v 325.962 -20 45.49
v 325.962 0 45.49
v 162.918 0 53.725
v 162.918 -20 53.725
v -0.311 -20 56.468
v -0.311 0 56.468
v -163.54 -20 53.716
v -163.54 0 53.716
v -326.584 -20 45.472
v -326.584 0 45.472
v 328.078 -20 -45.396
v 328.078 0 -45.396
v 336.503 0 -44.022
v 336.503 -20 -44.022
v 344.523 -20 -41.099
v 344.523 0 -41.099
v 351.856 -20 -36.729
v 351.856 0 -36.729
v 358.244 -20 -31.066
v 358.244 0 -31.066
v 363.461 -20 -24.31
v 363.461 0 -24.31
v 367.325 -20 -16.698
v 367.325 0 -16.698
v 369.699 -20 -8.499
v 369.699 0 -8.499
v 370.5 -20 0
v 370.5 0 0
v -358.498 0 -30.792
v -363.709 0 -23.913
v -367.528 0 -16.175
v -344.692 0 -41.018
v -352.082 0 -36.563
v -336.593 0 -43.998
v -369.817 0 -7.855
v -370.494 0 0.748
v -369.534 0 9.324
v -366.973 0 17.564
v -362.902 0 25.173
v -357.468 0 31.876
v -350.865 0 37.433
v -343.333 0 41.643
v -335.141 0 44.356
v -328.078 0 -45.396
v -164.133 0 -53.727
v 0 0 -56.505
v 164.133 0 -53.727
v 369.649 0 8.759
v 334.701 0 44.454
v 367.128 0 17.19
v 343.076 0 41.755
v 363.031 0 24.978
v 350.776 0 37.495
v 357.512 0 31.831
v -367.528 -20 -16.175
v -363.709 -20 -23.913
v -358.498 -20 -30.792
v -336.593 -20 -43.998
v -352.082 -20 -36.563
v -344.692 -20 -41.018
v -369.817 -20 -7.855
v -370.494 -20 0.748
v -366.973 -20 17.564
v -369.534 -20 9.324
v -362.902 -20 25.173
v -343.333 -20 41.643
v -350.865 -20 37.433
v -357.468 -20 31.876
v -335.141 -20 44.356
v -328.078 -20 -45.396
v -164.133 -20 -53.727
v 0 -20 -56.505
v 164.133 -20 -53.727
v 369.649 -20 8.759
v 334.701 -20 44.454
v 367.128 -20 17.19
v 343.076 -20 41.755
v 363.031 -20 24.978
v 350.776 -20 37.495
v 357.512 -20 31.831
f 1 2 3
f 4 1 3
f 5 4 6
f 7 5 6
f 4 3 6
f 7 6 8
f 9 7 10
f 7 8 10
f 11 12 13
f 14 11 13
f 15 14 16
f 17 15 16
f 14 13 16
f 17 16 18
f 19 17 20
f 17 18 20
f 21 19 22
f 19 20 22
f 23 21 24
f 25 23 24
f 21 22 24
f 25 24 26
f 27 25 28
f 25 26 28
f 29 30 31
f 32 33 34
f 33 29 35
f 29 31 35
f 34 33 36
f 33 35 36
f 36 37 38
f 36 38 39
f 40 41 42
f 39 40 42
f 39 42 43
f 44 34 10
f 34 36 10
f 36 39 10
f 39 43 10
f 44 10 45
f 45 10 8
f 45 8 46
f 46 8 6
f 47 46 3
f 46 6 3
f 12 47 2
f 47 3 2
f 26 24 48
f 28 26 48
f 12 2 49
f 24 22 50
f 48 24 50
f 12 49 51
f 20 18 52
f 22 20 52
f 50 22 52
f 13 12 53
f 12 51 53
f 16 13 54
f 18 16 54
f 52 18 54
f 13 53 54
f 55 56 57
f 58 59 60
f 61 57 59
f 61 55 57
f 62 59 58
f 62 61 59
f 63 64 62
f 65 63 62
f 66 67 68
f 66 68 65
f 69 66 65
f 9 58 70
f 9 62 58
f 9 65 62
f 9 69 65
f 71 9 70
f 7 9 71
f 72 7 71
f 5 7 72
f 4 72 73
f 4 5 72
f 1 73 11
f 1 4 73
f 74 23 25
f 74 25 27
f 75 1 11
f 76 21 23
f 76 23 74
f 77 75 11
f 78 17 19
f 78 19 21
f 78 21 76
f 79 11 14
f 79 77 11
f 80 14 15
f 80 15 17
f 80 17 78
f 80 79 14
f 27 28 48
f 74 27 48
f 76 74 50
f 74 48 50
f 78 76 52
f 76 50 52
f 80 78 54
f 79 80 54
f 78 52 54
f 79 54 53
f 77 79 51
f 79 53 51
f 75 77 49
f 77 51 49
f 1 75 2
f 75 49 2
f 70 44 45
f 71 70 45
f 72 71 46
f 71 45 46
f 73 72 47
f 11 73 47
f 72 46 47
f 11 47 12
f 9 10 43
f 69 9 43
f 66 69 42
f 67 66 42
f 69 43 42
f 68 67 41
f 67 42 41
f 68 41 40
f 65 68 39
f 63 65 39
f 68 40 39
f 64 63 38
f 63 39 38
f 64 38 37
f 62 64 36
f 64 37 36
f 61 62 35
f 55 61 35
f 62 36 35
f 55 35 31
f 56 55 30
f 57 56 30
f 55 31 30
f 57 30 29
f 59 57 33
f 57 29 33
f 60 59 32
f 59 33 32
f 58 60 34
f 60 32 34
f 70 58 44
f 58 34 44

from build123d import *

# Parameters (mm, degrees)
F1_DEPTH = 20


with BuildPart() as f1:
    # F0 (on Front) → F1 (new body)
    with BuildSketch(Plane.XZ):
        with BuildLine():
            ThreePointArc((-326.583678, 45.472431), (-293.391515, 32.728484), (-279.5, 0))
            Line((-279.5, 0), (279.5, 0))
            ThreePointArc((279.5, 0), (293.168529, 32.511651), (325.961867, 45.489832))
            ThreePointArc((325.961867, 45.489832), (-0.311198, 56.468207), (-326.583678, 45.472431))
        make_face()
        with BuildLine():
            Line((279.5, 0), (-279.5, 0))
            ThreePointArc((-279.5, 0), (-293.933876, -33.243735), (-328.077844, -45.39578))
            ThreePointArc((-328.077844, -45.39578), (0, -56.504902), (328.077844, -45.39578))
            ThreePointArc((328.077844, -45.39578), (293.933876, -33.243735), (279.5, 0))
        make_face()
        with BuildLine():
            ThreePointArc((-328.077844, -45.39578), (-293.933876, -33.243735), (-279.5, 0))
            ThreePointArc((-279.5, 0), (-293.391515, 32.728484), (-326.583678, 45.472431))
            ThreePointArc((-326.583678, 45.472431), (-370.49385, 0.748065), (-328.077844, -45.39578))
        make_face()
        with BuildLine():
            ThreePointArc((325.961867, 45.489832), (293.168529, 32.511651), (279.5, 0))
            ThreePointArc((279.5, 0), (293.933876, -33.243735), (328.077844, -45.39578))
            ThreePointArc((328.077844, -45.39578), (358.243735, -31.066124), (370.5, 0))
            ThreePointArc((370.5, 0), (357.511651, 31.831471), (325.961867, 45.489832))
        make_face()
    extrude(amount=F1_DEPTH)


solid = f1.part
